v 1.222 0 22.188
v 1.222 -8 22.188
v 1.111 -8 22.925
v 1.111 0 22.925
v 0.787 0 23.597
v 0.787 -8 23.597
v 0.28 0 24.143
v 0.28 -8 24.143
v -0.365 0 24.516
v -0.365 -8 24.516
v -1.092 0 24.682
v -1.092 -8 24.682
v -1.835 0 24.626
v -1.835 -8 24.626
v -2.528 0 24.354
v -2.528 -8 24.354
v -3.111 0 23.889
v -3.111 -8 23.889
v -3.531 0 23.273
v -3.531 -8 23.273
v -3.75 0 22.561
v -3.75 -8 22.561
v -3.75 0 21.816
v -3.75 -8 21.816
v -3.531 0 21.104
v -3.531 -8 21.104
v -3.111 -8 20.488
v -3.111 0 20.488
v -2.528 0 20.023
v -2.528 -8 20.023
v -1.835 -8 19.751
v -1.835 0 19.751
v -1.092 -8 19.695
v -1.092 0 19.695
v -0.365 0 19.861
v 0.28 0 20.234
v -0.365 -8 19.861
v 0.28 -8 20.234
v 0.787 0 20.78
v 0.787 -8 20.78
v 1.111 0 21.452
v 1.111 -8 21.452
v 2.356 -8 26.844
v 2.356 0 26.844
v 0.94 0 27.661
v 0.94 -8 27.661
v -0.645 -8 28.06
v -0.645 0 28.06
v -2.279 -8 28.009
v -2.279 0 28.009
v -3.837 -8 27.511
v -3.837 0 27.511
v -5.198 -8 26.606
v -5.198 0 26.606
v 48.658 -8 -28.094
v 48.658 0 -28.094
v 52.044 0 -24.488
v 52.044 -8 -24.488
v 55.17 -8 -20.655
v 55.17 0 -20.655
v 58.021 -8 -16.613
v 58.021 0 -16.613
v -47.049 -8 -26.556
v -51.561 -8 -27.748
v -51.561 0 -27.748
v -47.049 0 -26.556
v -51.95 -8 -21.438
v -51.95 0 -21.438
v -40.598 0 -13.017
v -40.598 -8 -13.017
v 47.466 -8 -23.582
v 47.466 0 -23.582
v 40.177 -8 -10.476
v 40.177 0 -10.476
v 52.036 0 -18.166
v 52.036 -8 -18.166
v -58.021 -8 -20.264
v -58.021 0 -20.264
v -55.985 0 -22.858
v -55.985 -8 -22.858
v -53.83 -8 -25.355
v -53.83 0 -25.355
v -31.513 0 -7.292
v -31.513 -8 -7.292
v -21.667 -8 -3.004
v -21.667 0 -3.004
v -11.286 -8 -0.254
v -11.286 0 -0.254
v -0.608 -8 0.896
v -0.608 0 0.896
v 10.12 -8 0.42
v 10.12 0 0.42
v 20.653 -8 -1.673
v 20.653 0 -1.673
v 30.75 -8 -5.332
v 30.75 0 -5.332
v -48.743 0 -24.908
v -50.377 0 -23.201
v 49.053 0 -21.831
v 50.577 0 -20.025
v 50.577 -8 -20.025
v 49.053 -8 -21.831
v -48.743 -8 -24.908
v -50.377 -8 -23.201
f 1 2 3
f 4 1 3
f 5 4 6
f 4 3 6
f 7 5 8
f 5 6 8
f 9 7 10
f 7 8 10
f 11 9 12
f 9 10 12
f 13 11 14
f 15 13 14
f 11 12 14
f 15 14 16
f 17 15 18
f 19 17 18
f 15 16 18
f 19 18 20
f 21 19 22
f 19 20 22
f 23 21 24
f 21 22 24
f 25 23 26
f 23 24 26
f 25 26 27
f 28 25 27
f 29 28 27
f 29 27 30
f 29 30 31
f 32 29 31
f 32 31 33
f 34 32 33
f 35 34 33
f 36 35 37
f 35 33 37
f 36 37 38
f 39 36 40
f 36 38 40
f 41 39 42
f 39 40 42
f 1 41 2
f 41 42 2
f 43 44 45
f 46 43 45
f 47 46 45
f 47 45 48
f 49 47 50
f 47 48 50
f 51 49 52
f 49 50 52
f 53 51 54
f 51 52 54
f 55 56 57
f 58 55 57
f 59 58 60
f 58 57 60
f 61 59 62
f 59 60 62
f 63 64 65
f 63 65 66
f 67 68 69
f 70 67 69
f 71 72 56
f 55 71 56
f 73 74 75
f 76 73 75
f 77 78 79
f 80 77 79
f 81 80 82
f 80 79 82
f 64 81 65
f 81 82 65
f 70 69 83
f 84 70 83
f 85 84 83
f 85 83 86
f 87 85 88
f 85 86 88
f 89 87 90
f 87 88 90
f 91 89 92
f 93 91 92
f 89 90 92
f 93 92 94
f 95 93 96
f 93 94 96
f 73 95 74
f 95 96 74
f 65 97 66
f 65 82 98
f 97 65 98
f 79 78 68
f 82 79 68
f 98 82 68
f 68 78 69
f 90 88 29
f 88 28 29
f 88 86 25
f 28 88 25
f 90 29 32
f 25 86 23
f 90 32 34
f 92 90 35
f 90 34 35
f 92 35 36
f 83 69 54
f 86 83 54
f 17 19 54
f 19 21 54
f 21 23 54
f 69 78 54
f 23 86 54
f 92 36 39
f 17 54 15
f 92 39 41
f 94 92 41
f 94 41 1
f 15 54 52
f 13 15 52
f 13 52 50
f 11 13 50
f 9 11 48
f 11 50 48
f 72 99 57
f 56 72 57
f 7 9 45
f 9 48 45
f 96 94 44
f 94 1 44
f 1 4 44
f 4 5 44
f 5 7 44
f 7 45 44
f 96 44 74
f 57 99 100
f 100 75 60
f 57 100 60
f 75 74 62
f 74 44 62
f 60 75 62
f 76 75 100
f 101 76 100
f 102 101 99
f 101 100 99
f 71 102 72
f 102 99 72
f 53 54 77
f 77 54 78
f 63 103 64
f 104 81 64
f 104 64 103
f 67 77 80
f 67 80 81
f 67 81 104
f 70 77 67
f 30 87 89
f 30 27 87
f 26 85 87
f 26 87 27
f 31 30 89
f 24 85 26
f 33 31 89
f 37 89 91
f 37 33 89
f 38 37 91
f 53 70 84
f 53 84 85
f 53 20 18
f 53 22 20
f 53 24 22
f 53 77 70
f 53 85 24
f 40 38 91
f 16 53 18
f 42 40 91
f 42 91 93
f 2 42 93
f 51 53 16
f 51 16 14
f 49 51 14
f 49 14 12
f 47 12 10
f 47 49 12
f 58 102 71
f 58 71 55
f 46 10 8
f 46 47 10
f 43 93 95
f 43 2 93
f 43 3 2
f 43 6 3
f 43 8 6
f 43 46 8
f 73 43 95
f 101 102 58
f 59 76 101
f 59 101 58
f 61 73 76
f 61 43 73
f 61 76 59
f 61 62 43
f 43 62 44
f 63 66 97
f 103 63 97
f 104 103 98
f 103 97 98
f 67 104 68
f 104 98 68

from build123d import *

# Parameters (mm, degrees)
F1_DEPTH = 8
F2_R     = 2.5
F3_DEPTH = 8


# Not quite as in the source:
# - ends of sketch curves that miss each other by under 0.0002 mm in the source are joined


with BuildPart() as f1:
    # F0 (on Front) → F1 (new body)
    with BuildSketch(Plane.XZ):
        with BuildLine():
            ThreePointArc((-58.0214256358, -20.2643207275), (-54.9218439489, -24.1190997792), (-51.5609168942, -27.7482728949))
            Line((-51.5609168942, -27.7482728949), (-47.048692, -26.555894))
            ThreePointArc((-47.048692, -26.555894), (-49.5674409521, -24.0619501846), (-51.9504921504, -21.4380372685))
            Line((-51.9504921504, -21.4380372685), (-40.598231, -13.017462))
            ThreePointArc((-40.598231, -13.017462), (-0.6084110144, 0.8961956506), (40.1770750491, -10.4756859243))
            Line((40.1770750491, -10.4756859243), (52.036298, -18.165861))
            ThreePointArc((52.036298, -18.165861), (49.8229328445, -20.9344101577), (47.4659668709, -23.5817788788))
            Line((47.4659668709, -23.5817788788), (48.658346, -28.094004))
            ThreePointArc((48.658346, -28.094004), (53.6407391456, -22.5987377774), (58.0214266089, -16.6127733984))
            Line((58.0214266089, -16.6127733984), (2.355576, 26.843505))
            ThreePointArc((2.355576, 26.843505), (-1.4641584631, 28.091083381), (-5.1978982267, 26.6058182555))
            Line((-5.1978982267, 26.6058182555), (-58.0214256358, -20.2643207275))
        make_face()
    extrude(amount=F1_DEPTH)

    # F2 (on face) → F3 (cut, through all)
    with BuildSketch(Plane.XZ.offset(8)):
        with Locations((-1.27842, 22.188493)):
            Circle(F2_R)
    extrude(amount=-F3_DEPTH, mode=Mode.SUBTRACT)


solid = f1.part
